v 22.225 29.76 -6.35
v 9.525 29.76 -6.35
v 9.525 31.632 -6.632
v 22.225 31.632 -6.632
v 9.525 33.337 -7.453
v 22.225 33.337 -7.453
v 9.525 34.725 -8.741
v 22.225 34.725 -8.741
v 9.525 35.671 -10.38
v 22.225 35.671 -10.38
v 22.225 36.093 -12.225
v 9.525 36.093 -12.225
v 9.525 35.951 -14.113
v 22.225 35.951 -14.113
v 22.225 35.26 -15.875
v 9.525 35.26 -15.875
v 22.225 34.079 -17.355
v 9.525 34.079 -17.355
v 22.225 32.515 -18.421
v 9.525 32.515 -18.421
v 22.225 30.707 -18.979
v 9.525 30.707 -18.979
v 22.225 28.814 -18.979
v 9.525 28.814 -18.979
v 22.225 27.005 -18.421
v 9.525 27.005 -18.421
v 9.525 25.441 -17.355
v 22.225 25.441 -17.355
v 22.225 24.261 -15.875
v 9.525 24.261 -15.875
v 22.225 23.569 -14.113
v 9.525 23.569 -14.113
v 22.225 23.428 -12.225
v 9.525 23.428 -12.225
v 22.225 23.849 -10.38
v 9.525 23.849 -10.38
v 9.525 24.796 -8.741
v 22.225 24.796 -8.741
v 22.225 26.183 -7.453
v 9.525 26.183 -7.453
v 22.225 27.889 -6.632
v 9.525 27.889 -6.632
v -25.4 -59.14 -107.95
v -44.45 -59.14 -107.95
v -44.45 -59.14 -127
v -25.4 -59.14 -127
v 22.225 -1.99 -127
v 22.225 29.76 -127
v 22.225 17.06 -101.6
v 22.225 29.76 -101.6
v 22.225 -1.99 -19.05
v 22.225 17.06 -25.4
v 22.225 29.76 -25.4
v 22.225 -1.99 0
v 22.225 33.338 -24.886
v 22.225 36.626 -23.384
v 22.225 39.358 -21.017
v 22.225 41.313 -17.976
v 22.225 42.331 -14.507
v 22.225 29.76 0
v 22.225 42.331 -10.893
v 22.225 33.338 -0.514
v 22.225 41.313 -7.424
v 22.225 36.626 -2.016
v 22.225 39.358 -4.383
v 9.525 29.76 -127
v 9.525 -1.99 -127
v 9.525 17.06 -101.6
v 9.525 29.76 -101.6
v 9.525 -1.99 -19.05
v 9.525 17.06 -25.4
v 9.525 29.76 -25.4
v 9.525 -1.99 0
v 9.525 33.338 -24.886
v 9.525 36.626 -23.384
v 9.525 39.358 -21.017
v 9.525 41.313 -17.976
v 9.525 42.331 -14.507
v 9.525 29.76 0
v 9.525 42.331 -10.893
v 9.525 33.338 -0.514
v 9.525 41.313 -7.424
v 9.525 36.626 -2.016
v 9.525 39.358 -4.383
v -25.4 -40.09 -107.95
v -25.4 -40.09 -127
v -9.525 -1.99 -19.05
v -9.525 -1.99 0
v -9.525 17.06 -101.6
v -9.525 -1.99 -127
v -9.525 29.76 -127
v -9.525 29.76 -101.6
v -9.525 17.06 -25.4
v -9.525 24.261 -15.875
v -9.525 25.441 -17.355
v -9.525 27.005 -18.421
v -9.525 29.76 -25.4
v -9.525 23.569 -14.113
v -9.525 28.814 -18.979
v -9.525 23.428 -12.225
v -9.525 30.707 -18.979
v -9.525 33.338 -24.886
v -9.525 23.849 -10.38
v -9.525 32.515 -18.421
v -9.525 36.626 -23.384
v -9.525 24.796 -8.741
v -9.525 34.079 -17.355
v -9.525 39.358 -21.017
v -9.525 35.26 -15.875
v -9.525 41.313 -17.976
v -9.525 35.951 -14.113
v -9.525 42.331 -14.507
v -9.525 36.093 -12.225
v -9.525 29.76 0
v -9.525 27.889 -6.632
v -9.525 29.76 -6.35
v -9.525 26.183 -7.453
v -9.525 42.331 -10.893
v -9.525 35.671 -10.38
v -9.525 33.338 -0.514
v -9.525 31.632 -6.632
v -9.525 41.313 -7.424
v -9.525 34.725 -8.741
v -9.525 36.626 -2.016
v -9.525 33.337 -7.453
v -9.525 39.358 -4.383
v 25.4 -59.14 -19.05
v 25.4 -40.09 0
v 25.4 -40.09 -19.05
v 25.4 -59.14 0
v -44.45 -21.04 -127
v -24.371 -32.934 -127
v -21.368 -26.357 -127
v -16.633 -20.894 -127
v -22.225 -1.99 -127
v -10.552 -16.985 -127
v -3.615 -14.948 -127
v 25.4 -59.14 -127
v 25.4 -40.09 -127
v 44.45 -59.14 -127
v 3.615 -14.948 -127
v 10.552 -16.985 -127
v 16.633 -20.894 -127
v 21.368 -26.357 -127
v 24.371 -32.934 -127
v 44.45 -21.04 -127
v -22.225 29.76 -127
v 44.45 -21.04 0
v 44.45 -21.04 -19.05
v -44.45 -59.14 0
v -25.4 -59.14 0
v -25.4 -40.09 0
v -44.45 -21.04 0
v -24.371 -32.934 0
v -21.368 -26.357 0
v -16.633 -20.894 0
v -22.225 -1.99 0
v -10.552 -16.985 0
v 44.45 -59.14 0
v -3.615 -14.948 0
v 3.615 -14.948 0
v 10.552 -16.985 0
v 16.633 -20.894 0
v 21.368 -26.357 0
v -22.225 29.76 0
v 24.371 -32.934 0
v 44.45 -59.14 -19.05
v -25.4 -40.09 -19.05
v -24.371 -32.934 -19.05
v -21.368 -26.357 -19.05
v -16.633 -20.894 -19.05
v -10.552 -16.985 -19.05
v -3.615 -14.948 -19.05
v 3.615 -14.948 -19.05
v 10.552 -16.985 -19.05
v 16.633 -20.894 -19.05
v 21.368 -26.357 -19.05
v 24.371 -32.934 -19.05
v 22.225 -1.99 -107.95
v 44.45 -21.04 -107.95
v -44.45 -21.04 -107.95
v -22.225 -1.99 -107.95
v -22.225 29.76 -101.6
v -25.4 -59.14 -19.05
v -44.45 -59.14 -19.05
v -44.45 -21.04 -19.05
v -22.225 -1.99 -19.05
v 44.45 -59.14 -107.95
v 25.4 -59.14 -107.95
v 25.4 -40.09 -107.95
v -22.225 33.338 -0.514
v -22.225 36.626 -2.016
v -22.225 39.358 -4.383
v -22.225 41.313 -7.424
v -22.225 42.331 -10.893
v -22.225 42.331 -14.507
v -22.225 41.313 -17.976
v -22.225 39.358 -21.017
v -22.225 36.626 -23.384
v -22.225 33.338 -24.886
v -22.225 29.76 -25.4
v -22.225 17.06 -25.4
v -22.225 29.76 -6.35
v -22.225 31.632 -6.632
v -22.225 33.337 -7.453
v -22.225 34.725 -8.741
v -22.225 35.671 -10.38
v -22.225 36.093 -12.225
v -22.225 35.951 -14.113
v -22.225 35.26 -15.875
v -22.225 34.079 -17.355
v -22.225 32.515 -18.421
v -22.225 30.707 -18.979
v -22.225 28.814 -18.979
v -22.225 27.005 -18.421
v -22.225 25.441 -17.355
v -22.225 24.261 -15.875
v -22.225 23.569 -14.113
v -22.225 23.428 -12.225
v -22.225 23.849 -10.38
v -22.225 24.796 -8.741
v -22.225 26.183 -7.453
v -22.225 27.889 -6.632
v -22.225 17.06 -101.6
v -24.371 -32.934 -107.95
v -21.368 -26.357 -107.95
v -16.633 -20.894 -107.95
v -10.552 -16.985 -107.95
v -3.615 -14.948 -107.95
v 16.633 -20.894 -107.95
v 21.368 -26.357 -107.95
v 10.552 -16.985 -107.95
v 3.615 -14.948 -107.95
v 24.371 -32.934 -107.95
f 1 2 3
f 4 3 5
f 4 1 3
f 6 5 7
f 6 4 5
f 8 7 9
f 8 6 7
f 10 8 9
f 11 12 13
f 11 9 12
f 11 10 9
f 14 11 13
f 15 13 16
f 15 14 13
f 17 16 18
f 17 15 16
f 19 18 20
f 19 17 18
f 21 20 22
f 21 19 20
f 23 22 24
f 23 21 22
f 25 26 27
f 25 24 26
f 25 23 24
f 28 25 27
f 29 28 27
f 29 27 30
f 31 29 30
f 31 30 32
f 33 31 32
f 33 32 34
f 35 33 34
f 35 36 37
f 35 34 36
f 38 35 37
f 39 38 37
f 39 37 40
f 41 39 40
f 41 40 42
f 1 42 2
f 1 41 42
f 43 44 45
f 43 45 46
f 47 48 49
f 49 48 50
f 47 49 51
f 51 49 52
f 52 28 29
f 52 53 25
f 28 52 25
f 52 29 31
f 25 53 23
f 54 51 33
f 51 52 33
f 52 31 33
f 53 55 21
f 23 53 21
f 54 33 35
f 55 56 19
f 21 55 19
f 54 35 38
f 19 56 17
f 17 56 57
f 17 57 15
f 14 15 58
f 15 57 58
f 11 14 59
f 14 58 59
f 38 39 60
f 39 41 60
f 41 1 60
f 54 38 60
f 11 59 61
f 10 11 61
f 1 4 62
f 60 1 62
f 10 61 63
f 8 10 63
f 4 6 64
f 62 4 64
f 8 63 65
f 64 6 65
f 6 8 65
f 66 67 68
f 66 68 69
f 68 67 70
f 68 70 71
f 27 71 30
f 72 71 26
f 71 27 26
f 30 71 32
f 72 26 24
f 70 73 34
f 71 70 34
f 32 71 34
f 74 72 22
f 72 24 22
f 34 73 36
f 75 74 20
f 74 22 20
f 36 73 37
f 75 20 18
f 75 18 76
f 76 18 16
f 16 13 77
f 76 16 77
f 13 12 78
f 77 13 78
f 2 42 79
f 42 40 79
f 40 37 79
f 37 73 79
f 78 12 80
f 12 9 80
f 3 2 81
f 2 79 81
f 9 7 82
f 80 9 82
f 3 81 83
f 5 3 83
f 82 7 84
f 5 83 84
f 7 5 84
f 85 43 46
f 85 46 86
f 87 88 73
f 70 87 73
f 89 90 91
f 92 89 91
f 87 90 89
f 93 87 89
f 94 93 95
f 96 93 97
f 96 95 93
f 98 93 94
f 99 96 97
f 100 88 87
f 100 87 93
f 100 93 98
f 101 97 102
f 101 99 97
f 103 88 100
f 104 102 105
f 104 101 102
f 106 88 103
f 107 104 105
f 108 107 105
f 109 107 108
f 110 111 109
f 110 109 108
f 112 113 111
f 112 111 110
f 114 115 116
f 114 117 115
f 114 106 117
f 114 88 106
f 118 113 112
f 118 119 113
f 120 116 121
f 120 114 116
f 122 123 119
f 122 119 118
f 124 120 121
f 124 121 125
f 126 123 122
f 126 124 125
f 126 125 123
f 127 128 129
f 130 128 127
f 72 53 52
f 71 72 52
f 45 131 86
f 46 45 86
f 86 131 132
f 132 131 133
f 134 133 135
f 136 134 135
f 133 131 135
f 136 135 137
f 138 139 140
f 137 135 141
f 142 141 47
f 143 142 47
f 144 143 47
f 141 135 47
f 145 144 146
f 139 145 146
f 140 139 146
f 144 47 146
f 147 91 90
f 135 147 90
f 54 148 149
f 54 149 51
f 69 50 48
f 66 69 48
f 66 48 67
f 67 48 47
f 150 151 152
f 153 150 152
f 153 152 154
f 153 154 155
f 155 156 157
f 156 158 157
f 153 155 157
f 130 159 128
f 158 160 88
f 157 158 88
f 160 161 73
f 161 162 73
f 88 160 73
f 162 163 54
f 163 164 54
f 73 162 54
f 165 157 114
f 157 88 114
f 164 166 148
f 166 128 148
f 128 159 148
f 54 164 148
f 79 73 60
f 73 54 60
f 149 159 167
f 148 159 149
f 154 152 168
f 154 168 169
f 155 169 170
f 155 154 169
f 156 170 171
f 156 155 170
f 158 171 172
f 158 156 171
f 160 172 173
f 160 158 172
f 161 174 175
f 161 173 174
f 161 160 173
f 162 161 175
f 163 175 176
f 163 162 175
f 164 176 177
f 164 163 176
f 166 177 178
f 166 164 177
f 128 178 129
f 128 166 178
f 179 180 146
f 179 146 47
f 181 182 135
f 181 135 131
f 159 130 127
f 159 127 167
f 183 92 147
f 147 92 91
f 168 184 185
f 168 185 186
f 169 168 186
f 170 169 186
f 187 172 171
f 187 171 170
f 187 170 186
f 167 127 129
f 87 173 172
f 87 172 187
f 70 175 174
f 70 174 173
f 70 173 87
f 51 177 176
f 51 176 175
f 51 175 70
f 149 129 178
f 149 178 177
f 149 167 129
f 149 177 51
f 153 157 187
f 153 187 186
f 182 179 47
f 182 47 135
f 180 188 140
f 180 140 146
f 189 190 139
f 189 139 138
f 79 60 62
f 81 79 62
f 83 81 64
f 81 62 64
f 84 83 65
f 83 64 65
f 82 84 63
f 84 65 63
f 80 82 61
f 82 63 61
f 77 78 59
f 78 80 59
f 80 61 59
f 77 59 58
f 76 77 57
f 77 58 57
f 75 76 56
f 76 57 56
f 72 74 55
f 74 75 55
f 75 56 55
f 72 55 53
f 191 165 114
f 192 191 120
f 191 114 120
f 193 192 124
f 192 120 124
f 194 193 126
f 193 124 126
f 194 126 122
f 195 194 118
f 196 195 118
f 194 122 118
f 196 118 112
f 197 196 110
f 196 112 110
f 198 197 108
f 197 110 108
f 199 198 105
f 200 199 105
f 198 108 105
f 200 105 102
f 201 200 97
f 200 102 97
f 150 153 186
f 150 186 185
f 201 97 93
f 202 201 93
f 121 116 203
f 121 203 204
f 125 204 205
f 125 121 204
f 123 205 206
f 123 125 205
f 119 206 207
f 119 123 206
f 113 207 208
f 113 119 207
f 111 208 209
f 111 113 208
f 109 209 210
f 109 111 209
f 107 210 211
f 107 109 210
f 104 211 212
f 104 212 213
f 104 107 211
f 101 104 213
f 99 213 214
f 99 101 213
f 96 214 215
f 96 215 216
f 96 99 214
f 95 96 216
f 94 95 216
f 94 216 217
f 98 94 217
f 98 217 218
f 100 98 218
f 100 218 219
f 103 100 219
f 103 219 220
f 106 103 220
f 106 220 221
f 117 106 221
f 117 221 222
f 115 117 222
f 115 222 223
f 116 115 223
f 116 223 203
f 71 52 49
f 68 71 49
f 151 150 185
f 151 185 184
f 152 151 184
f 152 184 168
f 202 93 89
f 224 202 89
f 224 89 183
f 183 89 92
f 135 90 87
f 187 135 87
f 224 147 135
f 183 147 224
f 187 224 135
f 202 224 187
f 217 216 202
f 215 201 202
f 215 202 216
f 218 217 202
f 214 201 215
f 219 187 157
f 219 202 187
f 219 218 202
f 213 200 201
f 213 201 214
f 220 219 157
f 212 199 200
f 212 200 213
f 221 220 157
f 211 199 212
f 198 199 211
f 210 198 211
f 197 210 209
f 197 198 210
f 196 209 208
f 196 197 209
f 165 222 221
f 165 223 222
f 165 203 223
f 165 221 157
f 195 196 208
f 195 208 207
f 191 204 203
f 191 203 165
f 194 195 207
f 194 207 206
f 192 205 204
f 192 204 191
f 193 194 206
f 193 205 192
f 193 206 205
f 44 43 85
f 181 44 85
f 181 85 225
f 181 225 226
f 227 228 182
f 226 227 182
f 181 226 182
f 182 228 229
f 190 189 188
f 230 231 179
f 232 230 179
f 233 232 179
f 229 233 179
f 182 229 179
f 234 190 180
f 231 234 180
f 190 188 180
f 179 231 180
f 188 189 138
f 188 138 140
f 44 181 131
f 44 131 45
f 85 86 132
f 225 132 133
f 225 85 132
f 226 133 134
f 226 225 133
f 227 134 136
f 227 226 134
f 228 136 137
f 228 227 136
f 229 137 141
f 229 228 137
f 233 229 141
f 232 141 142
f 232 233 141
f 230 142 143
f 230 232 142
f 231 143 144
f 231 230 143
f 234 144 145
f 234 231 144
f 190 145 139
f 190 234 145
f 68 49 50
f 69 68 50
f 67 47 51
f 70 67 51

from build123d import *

# Parameters (mm, degrees)
BOSS_EXTRUDE1_DEPTH = 127
SKETCH2_W           = 88.9
SKETCH2_H           = 57.15
CUT_EXTRUDE1_DEPTH  = 88.9
SKETCH3_R           = 6.35
BOSS_EXTRUDE2_DEPTH = 44.45
SKETCH4_W           = 19.05
SKETCH4_H           = 44.45
CUT_EXTRUDE2_DEPTH  = 127


with BuildPart() as part:
    # Sketch1 → Boss-Extrude1 (new body)
    with BuildSketch(Plane.XY):
        with BuildLine():
            Line((-44.45, -21.039739617), (-44.45, -59.139739617))
            Line((-44.45, -59.139739617), (-25.4, -59.139739617))
            Line((-25.4, -59.139739617), (-25.4, -40.089739617))
            ThreePointArc((-25.4, -40.089739617), (0, -14.689739617), (25.4, -40.089739617))
            Line((25.4, -40.089739617), (25.4, -59.139739617))
            Line((25.4, -59.139739617), (44.45, -59.139739617))
            Line((44.45, -59.139739617), (44.45, -21.039739617))
            Line((44.45, -21.039739617), (22.225, -1.989739617))
            Line((22.225, -1.989739617), (-22.225, -1.989739617))
            Line((-22.225, -1.989739617), (-44.45, -21.039739617))
        make_face()
    extrude(amount=-BOSS_EXTRUDE1_DEPTH)

    # Sketch2 → Cut-Extrude1 (cut)
    with BuildSketch(Plane(origin=(44.45, 0, 0), x_dir=(0, 0, -1), z_dir=(1, 0, 0))):
        with Locations((63.5, -30.564739617)):
            Rectangle(SKETCH2_W, SKETCH2_H)
    extrude(amount=-CUT_EXTRUDE1_DEPTH, mode=Mode.SUBTRACT)


with BuildPart() as cut_extrude1_piece_1:
    # of the separate pieces the step leaves, piece 1, a body of its own (cut_extrude1_pieces)
    add(part.part.solids().sort_by_distance((-44.45, -21.039739617, 0))[0])

    # Sketch3 → Boss-Extrude2 (add)
    with BuildSketch(Plane.ZY.offset(-22.225)):
        with BuildLine():
            Line((0, -1.989739617), (0, 29.760261325))
            ThreePointArc((0, 29.760261325), (-12.700000942, 42.460260383), (-25.4, 29.760259441))
            Line((-25.4, 29.760259441), (-25.4, 17.060260383))
            Line((-25.4, 17.060260383), (-101.6, 17.060260383))
            Line((-101.6, 17.060260383), (-101.6, 29.760260383))
            Line((-101.6, 29.760260383), (-127, 29.760260383))
            Line((-127, 29.760260383), (-127, -1.989739617))
            Line((-127, -1.989739617), (0, -1.989739617))
        make_face()
        with Locations((-12.7, 29.760260383)):
            Circle(SKETCH3_R, mode=Mode.SUBTRACT)
    extrude(amount=BOSS_EXTRUDE2_DEPTH)

    # Sketch4 → Cut-Extrude2 (cut)
    with BuildSketch(Plane.XY):
        with Locations((0, 20.235260383)):
            Rectangle(SKETCH4_W, SKETCH4_H)
    extrude(amount=-CUT_EXTRUDE2_DEPTH, mode=Mode.SUBTRACT)


with BuildPart() as cut_extrude1_piece_2:
    # of the separate pieces the step leaves, piece 2, a body of its own (cut_extrude1_pieces)
    add(part.part.solids().sort_by_distance((-44.45, -21.039739617, -107.95))[0])


solid = Compound([cut_extrude1_piece_1.part, cut_extrude1_piece_2.part])
